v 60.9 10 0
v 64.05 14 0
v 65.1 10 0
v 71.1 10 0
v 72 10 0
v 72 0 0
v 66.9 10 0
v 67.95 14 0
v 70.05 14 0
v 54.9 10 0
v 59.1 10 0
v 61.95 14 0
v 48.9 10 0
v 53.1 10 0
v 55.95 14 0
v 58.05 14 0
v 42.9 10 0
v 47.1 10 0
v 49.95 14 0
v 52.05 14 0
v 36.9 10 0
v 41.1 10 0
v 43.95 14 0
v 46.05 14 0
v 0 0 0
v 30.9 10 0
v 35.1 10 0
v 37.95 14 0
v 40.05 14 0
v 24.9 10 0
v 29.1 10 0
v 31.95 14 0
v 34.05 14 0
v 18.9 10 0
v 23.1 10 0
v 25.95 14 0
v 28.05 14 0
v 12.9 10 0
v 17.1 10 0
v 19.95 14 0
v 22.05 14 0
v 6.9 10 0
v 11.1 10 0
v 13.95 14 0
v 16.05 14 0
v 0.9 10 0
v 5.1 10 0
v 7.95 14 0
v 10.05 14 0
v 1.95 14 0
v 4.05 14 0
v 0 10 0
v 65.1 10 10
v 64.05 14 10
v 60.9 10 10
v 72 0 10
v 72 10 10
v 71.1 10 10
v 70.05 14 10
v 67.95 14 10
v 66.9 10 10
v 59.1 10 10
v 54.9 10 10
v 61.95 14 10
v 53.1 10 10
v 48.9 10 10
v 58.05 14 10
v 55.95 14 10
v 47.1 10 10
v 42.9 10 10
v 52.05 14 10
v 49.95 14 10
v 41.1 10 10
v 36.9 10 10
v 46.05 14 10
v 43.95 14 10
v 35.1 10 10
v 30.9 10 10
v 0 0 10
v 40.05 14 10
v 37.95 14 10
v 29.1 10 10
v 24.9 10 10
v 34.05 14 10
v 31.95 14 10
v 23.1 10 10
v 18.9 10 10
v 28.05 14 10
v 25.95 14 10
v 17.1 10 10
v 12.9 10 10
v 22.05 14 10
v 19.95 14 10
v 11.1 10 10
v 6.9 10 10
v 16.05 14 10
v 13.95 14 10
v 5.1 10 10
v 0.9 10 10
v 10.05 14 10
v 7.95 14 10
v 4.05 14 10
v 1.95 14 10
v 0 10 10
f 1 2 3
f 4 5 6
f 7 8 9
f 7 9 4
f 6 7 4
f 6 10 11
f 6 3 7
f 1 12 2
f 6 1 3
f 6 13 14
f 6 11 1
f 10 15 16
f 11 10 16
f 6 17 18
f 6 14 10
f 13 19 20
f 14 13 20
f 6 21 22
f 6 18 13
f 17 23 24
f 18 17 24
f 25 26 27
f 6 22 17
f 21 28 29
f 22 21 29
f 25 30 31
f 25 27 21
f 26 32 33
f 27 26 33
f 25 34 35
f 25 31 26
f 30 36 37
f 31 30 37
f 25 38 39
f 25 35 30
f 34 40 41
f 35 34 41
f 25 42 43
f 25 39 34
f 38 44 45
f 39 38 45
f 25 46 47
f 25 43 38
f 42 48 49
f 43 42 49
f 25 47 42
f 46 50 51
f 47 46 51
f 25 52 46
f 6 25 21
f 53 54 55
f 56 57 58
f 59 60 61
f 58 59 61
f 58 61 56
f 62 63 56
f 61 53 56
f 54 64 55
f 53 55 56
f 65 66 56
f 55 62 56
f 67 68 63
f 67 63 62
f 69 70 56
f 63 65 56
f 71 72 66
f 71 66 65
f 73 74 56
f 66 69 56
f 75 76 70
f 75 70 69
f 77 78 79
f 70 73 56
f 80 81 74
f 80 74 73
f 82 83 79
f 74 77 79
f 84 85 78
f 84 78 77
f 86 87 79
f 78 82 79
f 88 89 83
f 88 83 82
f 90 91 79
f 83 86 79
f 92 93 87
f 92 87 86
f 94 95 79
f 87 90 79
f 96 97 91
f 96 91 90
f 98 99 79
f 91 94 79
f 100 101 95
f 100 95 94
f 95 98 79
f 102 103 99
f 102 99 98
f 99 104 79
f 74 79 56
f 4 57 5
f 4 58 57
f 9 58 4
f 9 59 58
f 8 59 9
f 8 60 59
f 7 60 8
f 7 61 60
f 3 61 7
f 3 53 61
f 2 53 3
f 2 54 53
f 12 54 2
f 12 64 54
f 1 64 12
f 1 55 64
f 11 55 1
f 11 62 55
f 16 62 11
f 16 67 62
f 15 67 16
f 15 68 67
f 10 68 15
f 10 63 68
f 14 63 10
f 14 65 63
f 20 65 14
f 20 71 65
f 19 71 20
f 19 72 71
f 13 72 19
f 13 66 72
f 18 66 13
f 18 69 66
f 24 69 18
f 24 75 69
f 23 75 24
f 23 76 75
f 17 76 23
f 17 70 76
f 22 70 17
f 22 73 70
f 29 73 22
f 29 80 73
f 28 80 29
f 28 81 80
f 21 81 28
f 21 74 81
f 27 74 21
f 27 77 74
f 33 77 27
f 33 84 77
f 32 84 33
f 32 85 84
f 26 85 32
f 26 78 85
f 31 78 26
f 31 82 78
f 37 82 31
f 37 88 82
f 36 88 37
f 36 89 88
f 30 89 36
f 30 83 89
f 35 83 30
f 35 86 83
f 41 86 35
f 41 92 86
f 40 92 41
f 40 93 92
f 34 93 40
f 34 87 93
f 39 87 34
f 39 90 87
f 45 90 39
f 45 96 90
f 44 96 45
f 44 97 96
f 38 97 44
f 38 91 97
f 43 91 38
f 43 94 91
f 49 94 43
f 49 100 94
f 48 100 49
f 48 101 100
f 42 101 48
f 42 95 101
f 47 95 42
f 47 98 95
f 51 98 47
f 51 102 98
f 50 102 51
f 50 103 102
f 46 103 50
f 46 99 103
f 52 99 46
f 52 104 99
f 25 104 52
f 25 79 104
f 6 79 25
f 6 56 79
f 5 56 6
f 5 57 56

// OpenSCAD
$fn = 32;

// ----------------------------------------------------------------------
// Gear rack: 12 teeth, pitch 6 mm
// ----------------------------------------------------------------------

// --- parameters (mm) ---
teeth = 12;               // number of teeth
pitch = 6;                // tooth pitch, X
root_w = 4.2;             // tooth width at the root
tip_w = 2.1;              // tooth width at the tip
base_h = 10;              // rack body height, Y
tooth_h = 4;              // tooth height above the body
plate_t = 10;             // rack width, Z (extrusion height)

rack_l = teeth * pitch;  // overall length
total_h = base_h + tooth_h;  // overall height

profile = [[0, 0], [72, 0], [72, 10], [71.1, 10], [70.05, 14], [67.95, 14], [66.9, 10], [65.1, 10], [64.05, 14], [61.95, 14], [60.9, 10], [59.1, 10], [58.05, 14], [55.95, 14], [54.9, 10], [53.1, 10], [52.05, 14], [49.95, 14], [48.9, 10], [47.1, 10], [46.05, 14], [43.95, 14], [42.9, 10], [41.1, 10], [40.05, 14], [37.95, 14], [36.9, 10], [35.1, 10], [34.05, 14], [31.95, 14], [30.9, 10], [29.1, 10], [28.05, 14], [25.95, 14], [24.9, 10], [23.1, 10], [22.05, 14], [19.95, 14], [18.9, 10], [17.1, 10], [16.05, 14], [13.95, 14], [12.9, 10], [11.1, 10], [10.05, 14], [7.95, 14], [6.9, 10], [5.1, 10], [4.05, 14], [1.95, 14], [0.9, 10], [0, 10]];  // primary outline, 52 points, counter clockwise

// --- the one profile operation ---
linear_extrude(height = plate_t) polygon(points = profile);
